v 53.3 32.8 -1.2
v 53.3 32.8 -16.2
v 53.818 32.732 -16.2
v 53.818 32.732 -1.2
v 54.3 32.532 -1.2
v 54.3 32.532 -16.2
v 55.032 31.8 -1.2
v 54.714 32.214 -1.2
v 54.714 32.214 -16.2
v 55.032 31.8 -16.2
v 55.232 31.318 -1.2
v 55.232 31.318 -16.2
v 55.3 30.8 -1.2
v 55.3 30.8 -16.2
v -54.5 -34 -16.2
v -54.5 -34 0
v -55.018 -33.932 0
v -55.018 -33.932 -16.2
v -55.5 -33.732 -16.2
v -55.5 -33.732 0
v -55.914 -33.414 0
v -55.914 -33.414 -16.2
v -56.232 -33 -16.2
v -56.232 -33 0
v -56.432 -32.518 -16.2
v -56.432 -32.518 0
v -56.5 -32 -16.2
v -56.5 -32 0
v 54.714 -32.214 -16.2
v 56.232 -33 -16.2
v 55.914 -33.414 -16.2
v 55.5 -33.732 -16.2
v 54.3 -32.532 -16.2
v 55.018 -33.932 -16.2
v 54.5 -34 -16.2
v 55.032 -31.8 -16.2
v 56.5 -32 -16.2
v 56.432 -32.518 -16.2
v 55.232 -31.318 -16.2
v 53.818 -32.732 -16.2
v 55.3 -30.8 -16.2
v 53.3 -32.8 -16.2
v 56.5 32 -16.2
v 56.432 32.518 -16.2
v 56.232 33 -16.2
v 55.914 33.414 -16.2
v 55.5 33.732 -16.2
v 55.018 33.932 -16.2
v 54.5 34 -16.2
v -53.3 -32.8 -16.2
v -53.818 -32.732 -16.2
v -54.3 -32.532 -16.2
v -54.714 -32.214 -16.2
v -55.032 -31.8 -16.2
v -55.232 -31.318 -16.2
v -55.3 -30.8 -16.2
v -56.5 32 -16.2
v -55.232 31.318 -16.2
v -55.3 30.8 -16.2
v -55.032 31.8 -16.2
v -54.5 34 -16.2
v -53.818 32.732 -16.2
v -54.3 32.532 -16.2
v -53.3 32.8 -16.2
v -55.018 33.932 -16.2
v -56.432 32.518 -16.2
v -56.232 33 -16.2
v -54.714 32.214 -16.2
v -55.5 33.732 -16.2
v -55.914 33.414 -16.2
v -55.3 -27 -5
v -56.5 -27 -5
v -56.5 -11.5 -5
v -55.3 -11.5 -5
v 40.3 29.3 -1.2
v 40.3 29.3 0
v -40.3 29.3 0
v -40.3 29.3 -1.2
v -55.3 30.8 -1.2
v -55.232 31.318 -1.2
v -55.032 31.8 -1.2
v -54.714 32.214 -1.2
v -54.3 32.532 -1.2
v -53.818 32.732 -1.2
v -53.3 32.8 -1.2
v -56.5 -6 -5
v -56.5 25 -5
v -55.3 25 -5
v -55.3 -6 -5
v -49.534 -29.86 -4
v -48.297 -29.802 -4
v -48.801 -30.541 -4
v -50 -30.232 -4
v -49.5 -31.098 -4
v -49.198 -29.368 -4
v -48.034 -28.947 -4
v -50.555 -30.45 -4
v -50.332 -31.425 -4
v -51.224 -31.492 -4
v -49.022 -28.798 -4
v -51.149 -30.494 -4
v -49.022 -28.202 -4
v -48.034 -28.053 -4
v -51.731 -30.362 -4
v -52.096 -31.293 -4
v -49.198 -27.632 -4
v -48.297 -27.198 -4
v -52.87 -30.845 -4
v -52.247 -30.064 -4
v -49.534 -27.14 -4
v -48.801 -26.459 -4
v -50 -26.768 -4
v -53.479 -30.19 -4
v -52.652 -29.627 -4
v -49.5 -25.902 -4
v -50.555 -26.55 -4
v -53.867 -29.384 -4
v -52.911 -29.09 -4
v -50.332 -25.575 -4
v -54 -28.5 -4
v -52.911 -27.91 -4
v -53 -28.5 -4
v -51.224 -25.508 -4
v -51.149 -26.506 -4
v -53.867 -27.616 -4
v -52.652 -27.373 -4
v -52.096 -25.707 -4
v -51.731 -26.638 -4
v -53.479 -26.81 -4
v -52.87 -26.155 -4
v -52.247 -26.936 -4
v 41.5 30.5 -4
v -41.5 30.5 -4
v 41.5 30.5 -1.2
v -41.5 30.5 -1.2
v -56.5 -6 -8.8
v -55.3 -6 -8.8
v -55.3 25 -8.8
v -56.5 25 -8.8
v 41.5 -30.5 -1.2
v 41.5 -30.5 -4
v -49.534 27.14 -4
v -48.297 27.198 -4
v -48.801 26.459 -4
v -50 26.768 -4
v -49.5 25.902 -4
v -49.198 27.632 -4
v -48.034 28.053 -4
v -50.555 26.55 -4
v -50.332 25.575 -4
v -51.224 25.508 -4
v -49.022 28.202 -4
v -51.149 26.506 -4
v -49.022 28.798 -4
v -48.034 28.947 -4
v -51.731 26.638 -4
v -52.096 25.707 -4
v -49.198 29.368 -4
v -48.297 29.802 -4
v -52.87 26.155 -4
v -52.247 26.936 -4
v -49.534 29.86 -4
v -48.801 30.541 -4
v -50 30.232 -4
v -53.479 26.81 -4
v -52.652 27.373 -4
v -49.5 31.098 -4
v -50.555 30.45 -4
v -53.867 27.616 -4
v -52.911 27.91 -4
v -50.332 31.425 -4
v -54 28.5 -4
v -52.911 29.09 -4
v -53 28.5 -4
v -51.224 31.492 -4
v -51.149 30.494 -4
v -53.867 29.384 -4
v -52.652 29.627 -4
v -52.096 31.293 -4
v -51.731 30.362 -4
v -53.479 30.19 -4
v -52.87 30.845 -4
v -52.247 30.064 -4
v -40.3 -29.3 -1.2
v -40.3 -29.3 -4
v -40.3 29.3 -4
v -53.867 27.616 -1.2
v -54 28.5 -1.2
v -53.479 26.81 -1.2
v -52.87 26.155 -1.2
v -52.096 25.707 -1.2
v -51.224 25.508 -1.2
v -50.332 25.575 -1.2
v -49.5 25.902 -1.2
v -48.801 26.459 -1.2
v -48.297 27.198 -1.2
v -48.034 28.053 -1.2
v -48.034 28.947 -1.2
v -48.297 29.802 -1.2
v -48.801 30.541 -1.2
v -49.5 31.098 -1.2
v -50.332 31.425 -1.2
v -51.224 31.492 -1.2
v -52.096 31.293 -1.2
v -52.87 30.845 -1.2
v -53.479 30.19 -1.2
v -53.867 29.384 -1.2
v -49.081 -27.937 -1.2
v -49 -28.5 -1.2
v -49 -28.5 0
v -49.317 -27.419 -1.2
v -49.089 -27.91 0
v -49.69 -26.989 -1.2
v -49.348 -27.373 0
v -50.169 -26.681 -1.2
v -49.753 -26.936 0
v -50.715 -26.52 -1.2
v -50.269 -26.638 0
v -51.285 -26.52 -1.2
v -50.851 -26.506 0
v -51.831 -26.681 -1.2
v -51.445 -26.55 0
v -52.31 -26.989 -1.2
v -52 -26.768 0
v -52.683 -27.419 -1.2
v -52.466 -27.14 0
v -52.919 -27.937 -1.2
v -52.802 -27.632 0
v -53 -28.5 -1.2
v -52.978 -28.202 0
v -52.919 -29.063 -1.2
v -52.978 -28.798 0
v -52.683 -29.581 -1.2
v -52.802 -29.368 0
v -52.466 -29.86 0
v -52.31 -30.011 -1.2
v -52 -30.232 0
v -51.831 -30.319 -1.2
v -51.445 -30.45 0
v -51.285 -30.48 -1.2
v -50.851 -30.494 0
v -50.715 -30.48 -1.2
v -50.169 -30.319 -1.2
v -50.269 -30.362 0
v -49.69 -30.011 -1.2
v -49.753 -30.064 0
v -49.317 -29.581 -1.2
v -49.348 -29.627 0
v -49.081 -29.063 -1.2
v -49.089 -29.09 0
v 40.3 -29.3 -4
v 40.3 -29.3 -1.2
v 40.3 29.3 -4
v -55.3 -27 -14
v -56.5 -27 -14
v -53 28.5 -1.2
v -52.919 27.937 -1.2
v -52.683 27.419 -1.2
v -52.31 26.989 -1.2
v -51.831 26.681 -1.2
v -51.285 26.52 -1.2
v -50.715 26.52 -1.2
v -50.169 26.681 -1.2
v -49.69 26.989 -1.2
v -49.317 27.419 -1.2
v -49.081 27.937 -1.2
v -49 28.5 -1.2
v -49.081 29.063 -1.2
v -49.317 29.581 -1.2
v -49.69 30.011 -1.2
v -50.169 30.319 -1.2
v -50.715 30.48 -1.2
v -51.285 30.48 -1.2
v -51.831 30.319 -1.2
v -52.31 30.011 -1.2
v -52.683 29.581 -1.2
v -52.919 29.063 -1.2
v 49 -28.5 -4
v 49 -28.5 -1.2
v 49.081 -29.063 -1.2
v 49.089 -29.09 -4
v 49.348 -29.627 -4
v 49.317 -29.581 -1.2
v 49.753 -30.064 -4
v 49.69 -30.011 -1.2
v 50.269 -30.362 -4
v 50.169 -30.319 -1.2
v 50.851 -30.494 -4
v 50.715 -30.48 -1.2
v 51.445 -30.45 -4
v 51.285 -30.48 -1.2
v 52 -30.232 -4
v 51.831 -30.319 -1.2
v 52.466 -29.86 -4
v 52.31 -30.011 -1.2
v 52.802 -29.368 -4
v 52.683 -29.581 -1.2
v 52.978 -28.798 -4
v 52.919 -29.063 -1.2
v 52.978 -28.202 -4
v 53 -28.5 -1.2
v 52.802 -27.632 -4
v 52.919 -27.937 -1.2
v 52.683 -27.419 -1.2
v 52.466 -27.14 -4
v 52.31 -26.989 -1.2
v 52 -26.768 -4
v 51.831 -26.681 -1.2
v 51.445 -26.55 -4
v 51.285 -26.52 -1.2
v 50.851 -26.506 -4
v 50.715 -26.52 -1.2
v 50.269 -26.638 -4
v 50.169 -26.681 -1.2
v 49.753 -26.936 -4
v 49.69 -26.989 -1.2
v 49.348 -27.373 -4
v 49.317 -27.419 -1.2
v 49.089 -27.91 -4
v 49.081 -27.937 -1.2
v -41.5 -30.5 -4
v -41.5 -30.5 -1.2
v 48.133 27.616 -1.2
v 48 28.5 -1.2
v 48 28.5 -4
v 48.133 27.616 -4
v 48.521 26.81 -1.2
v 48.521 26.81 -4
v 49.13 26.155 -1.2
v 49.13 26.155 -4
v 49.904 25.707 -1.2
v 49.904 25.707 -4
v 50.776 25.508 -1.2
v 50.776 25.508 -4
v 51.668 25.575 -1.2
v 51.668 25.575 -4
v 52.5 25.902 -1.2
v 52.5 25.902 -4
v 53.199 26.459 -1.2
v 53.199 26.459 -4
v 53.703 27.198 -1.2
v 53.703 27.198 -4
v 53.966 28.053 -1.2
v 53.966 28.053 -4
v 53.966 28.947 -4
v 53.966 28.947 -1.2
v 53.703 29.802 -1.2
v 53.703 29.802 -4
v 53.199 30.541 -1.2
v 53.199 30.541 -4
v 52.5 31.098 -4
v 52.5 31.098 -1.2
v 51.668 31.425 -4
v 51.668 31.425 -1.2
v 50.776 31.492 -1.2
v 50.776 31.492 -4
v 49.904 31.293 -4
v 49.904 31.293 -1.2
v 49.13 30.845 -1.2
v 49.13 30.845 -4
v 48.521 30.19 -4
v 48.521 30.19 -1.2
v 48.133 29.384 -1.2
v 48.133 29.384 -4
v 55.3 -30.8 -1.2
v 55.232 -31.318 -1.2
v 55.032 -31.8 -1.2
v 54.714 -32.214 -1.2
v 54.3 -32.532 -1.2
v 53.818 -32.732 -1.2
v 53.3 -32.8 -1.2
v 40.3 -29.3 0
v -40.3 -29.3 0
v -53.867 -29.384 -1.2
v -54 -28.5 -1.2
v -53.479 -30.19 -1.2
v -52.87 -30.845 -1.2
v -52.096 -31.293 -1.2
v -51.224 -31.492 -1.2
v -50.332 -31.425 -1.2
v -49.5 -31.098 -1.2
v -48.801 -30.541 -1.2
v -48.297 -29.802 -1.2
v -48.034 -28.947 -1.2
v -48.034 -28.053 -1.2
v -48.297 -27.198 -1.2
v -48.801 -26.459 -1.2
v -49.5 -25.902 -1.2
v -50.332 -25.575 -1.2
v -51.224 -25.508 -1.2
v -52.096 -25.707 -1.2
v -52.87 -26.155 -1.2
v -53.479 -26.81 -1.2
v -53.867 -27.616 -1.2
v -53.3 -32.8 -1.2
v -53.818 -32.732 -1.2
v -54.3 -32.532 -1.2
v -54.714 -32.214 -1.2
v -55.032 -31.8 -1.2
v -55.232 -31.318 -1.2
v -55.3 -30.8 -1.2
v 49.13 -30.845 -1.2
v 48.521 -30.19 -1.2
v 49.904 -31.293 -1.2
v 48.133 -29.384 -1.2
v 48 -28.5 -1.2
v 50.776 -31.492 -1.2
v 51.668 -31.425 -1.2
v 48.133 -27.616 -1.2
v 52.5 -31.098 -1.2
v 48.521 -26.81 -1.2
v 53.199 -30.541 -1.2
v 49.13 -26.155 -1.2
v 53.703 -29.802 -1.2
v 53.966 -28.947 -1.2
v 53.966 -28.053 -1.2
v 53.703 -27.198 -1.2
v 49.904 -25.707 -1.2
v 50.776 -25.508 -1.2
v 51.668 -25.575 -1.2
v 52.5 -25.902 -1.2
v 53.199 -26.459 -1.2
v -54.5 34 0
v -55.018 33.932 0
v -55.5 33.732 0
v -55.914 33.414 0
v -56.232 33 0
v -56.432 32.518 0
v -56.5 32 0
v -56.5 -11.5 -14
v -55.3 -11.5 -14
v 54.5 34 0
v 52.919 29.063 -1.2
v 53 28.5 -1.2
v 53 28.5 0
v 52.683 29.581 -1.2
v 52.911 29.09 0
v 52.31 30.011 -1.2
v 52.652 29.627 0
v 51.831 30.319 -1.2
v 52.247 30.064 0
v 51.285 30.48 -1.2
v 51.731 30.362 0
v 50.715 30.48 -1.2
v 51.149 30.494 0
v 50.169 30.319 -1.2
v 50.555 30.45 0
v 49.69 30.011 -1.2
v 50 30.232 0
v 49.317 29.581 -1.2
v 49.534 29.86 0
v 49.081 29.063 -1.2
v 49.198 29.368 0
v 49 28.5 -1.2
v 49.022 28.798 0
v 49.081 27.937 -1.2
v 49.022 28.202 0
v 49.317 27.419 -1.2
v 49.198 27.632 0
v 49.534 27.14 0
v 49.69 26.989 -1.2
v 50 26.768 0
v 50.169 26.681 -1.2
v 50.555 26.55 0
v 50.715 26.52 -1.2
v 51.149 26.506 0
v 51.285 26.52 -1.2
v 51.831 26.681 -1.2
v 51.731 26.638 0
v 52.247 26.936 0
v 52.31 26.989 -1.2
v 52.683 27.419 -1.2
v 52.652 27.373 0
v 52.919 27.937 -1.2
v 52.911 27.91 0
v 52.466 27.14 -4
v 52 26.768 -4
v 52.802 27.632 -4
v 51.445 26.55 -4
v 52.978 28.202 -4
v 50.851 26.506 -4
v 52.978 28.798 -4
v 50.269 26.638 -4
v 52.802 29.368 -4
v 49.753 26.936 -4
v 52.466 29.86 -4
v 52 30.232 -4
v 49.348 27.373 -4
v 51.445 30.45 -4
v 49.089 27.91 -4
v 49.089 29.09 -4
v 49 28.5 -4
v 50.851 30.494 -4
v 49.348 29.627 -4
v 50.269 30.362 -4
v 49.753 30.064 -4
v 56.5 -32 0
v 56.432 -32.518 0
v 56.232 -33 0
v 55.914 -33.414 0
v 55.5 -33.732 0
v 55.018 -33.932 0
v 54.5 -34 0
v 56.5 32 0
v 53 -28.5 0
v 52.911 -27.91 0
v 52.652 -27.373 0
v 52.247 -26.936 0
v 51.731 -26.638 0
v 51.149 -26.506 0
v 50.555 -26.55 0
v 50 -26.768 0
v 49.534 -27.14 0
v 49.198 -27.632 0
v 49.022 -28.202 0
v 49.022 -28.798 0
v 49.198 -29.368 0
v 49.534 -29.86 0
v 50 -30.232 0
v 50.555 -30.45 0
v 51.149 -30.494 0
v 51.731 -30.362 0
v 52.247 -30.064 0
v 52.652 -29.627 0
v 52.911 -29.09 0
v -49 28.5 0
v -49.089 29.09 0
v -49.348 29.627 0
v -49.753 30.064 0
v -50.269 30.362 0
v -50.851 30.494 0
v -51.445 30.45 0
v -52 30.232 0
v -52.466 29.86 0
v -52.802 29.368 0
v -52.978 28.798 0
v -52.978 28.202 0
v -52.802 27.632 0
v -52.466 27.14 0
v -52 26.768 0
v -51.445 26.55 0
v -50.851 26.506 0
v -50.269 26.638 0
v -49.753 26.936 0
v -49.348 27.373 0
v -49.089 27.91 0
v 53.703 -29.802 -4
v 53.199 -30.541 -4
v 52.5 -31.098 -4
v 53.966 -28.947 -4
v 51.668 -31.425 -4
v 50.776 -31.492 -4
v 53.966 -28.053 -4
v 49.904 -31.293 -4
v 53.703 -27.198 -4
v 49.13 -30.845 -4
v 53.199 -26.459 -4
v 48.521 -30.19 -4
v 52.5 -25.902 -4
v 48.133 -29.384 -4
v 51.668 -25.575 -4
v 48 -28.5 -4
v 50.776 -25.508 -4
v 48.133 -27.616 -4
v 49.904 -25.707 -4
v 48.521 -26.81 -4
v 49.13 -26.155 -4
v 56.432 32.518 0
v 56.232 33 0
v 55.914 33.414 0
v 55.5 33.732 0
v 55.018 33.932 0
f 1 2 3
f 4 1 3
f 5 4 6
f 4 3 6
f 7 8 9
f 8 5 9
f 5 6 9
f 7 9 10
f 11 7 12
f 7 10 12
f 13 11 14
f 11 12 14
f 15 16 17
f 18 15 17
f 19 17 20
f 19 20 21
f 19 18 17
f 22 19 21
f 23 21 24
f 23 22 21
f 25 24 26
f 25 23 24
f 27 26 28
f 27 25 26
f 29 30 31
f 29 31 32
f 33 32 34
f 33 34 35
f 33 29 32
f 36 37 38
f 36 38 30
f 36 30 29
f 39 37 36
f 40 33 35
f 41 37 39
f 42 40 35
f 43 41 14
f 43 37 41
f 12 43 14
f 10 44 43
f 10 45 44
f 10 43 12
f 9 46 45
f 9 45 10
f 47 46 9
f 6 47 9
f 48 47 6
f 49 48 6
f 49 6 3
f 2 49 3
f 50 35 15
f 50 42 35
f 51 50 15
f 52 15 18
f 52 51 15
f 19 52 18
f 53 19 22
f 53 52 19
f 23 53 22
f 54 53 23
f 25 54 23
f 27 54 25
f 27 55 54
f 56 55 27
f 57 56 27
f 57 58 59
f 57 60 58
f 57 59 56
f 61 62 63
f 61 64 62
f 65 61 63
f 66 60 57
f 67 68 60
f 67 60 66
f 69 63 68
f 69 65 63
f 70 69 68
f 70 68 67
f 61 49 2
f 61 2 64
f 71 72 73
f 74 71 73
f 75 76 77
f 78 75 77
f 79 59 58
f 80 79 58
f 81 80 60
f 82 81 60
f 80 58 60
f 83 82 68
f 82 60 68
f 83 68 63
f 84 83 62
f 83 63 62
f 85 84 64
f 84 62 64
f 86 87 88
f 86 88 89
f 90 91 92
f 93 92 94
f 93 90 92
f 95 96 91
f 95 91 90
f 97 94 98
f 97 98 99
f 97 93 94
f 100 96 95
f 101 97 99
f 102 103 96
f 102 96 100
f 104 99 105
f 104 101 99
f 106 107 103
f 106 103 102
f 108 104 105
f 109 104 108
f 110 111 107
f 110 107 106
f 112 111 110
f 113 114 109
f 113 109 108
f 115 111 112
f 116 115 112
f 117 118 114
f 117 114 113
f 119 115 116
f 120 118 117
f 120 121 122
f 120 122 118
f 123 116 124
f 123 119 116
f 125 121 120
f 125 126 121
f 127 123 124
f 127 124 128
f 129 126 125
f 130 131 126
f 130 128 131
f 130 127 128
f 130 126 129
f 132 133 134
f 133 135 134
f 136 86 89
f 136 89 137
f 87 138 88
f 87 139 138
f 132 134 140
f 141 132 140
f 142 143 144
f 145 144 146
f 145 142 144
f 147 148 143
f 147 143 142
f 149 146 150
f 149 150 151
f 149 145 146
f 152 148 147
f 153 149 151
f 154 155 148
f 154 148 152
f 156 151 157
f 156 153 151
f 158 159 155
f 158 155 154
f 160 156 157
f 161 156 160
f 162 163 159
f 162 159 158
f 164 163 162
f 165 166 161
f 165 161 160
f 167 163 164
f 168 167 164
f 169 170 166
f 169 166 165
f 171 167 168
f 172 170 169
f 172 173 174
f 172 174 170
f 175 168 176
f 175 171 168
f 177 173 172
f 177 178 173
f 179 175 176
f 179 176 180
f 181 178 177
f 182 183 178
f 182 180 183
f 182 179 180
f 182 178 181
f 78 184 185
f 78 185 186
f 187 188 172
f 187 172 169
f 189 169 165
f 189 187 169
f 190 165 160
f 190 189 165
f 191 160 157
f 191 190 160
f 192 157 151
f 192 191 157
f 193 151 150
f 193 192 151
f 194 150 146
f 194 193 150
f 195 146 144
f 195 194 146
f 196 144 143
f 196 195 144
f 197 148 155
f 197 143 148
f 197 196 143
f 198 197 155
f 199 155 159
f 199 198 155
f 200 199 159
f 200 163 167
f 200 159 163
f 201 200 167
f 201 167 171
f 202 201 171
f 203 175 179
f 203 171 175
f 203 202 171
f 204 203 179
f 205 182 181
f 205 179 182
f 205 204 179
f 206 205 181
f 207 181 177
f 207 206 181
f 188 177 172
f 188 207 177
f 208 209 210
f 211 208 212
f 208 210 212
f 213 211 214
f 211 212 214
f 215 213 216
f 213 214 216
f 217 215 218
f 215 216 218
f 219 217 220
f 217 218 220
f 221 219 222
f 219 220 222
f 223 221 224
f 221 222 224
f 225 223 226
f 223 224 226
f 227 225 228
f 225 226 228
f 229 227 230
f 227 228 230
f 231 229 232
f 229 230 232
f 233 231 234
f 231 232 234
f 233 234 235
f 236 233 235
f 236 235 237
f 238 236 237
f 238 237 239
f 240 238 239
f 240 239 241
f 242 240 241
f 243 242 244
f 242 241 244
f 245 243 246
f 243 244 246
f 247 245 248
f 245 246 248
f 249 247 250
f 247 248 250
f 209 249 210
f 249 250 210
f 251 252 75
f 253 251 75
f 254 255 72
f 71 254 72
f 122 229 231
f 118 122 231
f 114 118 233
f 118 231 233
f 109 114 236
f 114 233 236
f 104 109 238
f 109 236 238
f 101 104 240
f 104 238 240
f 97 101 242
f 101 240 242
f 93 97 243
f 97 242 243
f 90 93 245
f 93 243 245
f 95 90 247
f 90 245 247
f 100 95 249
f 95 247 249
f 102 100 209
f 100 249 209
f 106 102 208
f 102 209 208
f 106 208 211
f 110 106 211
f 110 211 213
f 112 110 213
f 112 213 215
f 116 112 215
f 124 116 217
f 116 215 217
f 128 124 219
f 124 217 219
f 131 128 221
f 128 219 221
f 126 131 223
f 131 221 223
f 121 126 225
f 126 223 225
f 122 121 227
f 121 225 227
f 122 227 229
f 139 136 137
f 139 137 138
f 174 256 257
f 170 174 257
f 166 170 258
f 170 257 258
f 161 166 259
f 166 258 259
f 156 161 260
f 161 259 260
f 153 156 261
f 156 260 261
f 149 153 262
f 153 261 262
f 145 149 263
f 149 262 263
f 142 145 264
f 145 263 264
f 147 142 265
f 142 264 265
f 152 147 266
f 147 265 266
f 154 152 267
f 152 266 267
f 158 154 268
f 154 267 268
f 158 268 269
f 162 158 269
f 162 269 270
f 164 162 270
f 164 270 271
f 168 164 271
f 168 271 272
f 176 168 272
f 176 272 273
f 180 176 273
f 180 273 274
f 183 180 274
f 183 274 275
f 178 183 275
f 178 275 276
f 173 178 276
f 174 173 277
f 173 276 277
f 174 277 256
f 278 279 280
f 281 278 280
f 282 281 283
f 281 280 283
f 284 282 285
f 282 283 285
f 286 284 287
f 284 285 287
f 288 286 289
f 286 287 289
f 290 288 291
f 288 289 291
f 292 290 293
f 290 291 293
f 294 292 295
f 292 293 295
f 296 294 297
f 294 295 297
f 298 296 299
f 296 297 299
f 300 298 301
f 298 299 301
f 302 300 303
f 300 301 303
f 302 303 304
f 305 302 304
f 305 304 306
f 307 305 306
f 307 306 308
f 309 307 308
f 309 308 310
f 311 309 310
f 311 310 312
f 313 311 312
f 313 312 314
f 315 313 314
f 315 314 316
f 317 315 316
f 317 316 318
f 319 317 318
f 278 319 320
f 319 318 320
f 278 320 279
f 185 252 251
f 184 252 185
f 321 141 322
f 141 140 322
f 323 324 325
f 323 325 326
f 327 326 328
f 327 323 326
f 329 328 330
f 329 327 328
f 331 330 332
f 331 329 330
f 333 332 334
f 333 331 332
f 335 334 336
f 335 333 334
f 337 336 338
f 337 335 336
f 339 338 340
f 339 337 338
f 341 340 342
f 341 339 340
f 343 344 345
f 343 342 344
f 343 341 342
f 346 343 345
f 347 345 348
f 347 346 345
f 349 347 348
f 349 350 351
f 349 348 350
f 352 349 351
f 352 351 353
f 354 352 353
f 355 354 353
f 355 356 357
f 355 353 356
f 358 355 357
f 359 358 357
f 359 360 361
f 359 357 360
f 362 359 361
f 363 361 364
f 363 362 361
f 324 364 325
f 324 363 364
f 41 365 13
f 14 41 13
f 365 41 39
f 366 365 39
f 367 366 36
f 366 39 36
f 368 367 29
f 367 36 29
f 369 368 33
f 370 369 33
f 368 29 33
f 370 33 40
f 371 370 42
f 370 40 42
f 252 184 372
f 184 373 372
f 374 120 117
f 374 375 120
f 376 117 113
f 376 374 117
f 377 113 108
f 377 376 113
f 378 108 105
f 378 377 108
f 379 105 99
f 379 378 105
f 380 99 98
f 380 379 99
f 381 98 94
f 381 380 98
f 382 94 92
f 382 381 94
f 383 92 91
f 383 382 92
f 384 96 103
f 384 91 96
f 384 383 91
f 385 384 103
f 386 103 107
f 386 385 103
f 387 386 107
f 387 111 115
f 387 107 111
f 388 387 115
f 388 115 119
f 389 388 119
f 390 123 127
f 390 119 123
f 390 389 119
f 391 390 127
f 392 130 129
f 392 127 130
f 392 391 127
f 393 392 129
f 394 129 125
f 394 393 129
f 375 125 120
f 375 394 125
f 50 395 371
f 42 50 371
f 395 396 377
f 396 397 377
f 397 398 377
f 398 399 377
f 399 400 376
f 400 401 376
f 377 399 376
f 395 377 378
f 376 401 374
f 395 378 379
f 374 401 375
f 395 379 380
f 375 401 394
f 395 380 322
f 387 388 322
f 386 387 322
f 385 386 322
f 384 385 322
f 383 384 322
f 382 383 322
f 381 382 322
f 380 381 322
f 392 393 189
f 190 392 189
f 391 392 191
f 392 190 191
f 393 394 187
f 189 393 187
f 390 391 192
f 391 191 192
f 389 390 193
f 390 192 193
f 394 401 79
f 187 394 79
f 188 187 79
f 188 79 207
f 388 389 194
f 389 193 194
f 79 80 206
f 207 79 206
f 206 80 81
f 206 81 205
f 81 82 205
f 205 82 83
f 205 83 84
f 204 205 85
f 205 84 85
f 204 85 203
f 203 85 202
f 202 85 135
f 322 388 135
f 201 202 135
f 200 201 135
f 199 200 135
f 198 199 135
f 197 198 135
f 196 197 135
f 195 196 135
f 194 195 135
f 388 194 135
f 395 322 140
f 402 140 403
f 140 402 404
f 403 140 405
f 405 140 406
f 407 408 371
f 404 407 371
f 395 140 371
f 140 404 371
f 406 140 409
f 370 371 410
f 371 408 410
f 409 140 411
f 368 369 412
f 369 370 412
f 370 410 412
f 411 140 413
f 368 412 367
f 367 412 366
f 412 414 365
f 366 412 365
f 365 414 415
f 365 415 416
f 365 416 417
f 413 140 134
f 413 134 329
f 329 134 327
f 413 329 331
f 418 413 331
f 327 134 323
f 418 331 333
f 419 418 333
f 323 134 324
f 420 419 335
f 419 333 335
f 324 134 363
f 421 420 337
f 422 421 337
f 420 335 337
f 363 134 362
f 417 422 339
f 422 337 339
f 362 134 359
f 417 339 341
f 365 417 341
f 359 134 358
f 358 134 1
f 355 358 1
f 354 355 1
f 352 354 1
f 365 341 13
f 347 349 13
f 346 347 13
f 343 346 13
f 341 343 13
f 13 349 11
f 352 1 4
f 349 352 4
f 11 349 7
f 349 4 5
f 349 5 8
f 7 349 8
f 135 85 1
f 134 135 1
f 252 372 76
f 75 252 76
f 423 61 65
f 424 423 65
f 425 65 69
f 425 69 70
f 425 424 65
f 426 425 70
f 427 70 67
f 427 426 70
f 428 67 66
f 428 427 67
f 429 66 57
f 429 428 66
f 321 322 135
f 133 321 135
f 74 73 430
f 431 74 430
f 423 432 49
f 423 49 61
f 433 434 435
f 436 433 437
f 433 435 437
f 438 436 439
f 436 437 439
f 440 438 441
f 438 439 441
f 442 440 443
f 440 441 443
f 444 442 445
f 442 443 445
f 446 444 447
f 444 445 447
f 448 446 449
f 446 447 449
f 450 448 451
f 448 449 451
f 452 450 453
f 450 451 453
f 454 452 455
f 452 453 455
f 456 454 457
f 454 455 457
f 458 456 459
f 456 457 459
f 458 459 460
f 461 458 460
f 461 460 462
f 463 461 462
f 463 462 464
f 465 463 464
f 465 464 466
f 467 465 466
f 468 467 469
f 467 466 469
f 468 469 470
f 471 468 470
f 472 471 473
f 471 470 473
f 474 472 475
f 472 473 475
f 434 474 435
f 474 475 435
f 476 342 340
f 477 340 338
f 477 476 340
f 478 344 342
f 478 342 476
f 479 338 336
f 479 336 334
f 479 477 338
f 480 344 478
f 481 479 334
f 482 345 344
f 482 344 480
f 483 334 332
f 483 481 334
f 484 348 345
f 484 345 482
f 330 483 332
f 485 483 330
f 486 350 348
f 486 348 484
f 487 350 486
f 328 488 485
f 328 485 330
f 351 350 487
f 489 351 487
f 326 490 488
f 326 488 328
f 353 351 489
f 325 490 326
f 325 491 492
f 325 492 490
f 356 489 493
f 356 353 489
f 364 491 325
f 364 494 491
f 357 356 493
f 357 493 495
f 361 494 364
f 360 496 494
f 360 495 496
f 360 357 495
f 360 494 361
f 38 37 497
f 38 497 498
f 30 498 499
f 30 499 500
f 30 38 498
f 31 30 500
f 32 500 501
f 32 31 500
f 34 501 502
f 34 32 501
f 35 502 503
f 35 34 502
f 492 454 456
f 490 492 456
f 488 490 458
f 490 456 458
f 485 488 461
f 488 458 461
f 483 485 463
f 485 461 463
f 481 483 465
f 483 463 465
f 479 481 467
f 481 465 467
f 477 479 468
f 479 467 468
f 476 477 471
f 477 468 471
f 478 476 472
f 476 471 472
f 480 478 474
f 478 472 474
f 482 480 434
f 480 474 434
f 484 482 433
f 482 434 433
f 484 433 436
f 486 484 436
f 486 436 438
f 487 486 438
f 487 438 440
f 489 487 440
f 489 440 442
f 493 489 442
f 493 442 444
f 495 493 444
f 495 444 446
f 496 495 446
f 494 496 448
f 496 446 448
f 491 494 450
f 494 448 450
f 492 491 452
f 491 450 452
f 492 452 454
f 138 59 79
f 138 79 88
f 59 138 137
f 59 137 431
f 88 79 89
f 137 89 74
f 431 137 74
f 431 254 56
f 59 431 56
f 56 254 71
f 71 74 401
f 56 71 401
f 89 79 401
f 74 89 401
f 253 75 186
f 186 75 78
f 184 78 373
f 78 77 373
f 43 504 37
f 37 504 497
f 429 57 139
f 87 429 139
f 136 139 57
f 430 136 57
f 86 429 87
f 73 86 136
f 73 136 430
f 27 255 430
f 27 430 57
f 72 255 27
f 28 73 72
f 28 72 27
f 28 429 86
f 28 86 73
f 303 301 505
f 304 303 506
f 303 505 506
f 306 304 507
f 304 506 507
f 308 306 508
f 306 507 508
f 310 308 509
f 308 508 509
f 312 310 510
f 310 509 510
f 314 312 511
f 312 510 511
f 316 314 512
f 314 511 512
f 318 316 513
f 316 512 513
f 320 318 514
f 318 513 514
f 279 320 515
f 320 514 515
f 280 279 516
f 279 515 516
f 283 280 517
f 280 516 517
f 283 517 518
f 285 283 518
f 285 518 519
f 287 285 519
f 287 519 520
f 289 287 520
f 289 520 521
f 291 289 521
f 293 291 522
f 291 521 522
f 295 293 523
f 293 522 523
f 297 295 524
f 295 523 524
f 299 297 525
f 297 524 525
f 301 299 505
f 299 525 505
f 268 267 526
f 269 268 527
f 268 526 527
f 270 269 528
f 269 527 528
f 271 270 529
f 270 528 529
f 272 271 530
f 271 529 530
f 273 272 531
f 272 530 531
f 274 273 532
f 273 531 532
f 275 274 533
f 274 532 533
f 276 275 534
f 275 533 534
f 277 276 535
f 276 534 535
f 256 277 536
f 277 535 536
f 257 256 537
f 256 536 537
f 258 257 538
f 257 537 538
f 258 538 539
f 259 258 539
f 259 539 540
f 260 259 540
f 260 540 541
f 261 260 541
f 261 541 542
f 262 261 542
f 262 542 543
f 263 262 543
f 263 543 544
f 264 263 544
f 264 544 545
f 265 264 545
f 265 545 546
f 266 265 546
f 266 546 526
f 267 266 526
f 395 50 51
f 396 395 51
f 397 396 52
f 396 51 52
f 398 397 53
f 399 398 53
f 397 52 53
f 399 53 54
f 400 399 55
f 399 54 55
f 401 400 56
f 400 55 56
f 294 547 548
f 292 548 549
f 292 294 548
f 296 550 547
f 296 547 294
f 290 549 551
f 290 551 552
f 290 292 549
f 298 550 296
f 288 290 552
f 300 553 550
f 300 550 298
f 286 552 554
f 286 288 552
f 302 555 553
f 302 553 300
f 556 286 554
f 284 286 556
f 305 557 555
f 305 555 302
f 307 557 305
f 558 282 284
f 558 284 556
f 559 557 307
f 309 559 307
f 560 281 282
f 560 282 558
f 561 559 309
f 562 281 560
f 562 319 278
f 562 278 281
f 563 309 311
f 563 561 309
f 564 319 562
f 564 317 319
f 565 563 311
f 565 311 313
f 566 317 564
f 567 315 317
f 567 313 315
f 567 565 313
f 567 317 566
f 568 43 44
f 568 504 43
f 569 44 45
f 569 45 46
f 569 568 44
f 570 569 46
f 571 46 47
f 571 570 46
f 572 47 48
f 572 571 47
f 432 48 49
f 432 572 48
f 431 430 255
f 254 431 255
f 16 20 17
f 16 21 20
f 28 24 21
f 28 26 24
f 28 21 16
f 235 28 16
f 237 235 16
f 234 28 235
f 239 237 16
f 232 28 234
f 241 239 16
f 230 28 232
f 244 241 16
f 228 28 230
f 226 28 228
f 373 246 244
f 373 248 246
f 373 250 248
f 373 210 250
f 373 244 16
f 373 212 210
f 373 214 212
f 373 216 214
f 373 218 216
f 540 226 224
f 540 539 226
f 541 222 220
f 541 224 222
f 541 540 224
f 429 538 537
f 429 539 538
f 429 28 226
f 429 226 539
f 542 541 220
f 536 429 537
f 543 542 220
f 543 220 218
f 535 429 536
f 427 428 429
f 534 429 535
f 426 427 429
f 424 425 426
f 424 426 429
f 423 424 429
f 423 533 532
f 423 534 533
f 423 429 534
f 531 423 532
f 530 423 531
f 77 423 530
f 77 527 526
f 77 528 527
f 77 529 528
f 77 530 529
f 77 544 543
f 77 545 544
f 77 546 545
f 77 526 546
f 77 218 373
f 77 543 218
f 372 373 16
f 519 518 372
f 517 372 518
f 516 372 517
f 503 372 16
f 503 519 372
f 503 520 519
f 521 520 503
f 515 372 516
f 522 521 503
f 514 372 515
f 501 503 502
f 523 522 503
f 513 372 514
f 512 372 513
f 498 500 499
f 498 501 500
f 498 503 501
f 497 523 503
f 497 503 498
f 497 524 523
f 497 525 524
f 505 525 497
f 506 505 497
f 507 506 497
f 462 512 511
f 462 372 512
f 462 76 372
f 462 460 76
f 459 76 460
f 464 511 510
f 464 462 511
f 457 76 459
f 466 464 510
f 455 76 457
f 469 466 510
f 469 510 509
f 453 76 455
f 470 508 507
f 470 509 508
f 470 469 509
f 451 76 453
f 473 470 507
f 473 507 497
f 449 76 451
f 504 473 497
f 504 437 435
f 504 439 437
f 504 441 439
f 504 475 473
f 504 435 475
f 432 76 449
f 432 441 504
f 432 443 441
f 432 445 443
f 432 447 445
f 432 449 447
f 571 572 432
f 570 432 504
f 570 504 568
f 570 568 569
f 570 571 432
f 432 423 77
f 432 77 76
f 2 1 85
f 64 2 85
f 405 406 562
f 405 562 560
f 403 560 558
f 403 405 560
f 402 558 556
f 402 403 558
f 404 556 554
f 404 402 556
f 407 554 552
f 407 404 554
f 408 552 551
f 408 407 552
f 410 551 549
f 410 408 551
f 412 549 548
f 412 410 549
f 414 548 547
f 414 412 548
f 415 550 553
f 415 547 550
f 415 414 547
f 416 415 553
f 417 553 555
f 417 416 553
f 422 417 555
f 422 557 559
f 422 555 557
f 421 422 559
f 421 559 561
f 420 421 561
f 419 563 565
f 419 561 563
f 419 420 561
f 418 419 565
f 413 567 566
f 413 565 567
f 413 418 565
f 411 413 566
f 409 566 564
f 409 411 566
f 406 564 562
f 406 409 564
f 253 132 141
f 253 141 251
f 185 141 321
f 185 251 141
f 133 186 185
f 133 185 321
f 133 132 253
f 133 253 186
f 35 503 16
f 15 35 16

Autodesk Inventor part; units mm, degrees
ref_plane "YZ Plane" through (0, 0, 0) normal (1, 0, 0) x (0, 1, 0)
ref_plane "XZ Plane" through (0, 0, 0) normal (0, 1, 0) x (-1, 0, 0)
sketch "Skizze1" plane through (0, 0, 0) normal (0, 0, 1) x (1, 0, 0)
  line L0 (-40.3, -29.3) -> (40.3, -29.3)
  line L1 (40.3, -29.3) -> (40.3, 29.3)
  line L2 (40.3, 29.3) -> (-40.3, 29.3)
  line L3 (-40.3, 29.3) -> (-40.3, -29.3)
  line L4 (40, 29) -> (-40, 29) projected
  line L5 (-40, 29) -> (-40, -29) projected
  line L6 (-40, -29) -> (40, -29) projected
  line L7 (40, -29) -> (40, 29) projected
  line L8 (-56.5, -34) -> (56.5, -34)
  line L9 (56.5, -34) -> (56.5, 34)
  line L10 (56.5, 34) -> (-56.5, 34)
  line L11 (-56.5, 34) -> (-56.5, -34)
  line L12 (53, 32.5) -> (-53, 32.5) projected
  line L13 (-53, -32.5) -> (53, -32.5) projected
  line L14 (55, -30.5) -> (55, 30.5) projected
  line L15 (-55, 30.5) -> (-55, -30.5) projected
  circle A0 centre (-51, 28.5) radius 2 projected
  circle A1 centre (51, 28.5) radius 2 projected
  circle A2 centre (51, -28.5) radius 2 projected
  circle A3 centre (-51, -28.5) radius 2 projected
  point P0 (0, 0)
  dimension "d0" = 0.3
  dimension "d1" = 0.3
  dimension "d2" = 0.3
  dimension "d3" = 0.3
  dimension "d4" = 1.5
  dimension "d5" = 1.5
  dimension "d6" = 1.5
  dimension "d7" = 1.5
extrude "Extrusion1" add sketch "Skizze1" against normal blind 1.2 contours L11 L10 L9 L8
sketch "Skizze2" plane through (0, 0, -1.2) normal (0, 0, -1) x (-1, 0, 0)
  circle A0 centre (-51, 28.5) radius 2 projected
  circle A1 centre (51, 28.5) radius 2 projected
  circle A2 centre (51, -28.5) radius 2 projected
  circle A3 centre (-51, -28.5) radius 2 projected
  circle A4 centre (-51, 28.5) radius 3
  circle A5 centre (51, 28.5) radius 3
  circle A6 centre (-51, -28.5) radius 3
  circle A7 centre (51, -28.5) radius 3
  line L0 (-40.3, -29.3) -> (-40.3, 29.3) projected
  line L1 (-40.3, 29.3) -> (40.3, 29.3) projected
  line L2 (-40.3, -29.3) -> (40.3, -29.3)
  line L3 (40.3, -29.3) -> (40.3, 29.3)
  line L4 (40.3, 29.3) -> (-40.3, 29.3)
  line L5 (-40.3, 29.3) -> (-40.3, -29.3)
  line L6 (41.5, 30.5) -> (-41.5, 30.5)
  line L7 (-41.5, 30.5) -> (-41.5, -30.5)
  line L8 (-41.5, -30.5) -> (41.5, -30.5)
  line L9 (41.5, -30.5) -> (41.5, 30.5)
  point P0 (0, 0)
  point P1 (53.2361, -26.5)
  point P2 (48.7639, -26.5)
  point P3 (51, -26.5)
  dimension "d10" = 6
  dimension "d11" = 6
  dimension "d12" = 6
  dimension "d13" = 6
  dimension "d14" = 1.2
  dimension "d15" = 1.2
  dimension "d16" = 1.2
  dimension "d17" = 1.2
ref_plane "Arbeitsebene1" through (-55, -32.5, -4) normal (0, 0, 1) x (1, 0, 0)
extrude "Extrusion2" add sketch "Skizze2" along normal up to surface (2.8 mm away)
sketch "Skizze3" plane through (0, 0, -1.2) normal (0, 0, -1) x (-1, 0, 0)
  line L0 (-56.5, -34) -> (56.5, -34) projected
  line L1 (-56.5, 34) -> (-56.5, -34) projected
  line L2 (56.5, -34) -> (-56.5, -34)
  line L3 (-56.5, -34) -> (-56.5, 34)
  line L4 (-56.5, 34) -> (56.5, 34)
  line L5 (56.5, 34) -> (56.5, -34)
  line L6 (-55.3, 32.8) -> (55.3, 32.8)
  line L7 (55.3, 32.8) -> (55.3, -32.8)
  line L8 (55.3, -32.8) -> (-55.3, -32.8)
  line L9 (-55.3, -32.8) -> (-55.3, 32.8)
  point P0 (0, 0)
  dimension "d20" = 1.2
  dimension "d21" = 1.2
  dimension "d22" = 1.2
  dimension "d23" = 1.2
extrude "Extrusion3" add sketch "Skizze3" along normal blind 15
fillet "Rundung1" radius 2 8 edges at (55.3, 32.8, -8.7) (-55.3, 32.8, -8.7) (-55.3, -32.8, -8.7) (56.5, -34, -8.1) (-56.5, -34, -8.1) (-56.5, 34, -8.1) (56.5, 34, -8.1) (55.3, -32.8, -8.7)
sketch "Skizze4" plane through (-56.5, -32, 0) normal (-1, 0, 0) x (0, 0, 1)
  line L0 (-5.5, 1.5) -> (-5.5, 5.5) construction
  line L1 (-5.5, 1.5) -> (-4, 1.5) construction
  line L2 (-4, 62.5) -> (-4, 1.5) construction
  line L3 (-5.5, 62.5) -> (-4, 62.5) construction
  line L4 (-5.5, 56.5) -> (-5.5, 62.5) construction
  line L5 (-5.5, 56.5) -> (-8.3, 56.5) construction
  line L6 (-8.3, 26.5) -> (-8.3, 56.5) construction
  line L7 (-5.5, 26.5) -> (-8.3, 26.5) construction
  line L8 (-5.5, 20) -> (-5.5, 26.5) construction
  line L9 (-5.5, 20) -> (-13.5, 20) construction
  line L10 (-13.5, 5.5) -> (-13.5, 20) construction
  line L11 (-5.5, 5.5) -> (-13.5, 5.5) construction
  line L12 (-5, 20.5) -> (-14, 20.5)
  line L13 (-14, 20.5) -> (-14, 5)
  line L14 (-14, 5) -> (-5, 5)
  line L15 (-5, 5) -> (-5, 20.5)
  line L16 (-5, 26) -> (-8.8, 26)
  line L17 (-8.8, 26) -> (-8.8, 57)
  line L18 (-8.8, 57) -> (-5, 57)
  line L19 (-5, 57) -> (-5, 26)
  point P0 (0, 32)
  dimension "d27" = 0.5
  dimension "d28" = 0.5
  dimension "d29" = 0.5
  dimension "d30" = 0.5
  dimension "d31" = 0.5
  dimension "d32" = 0.5
  dimension "d33" = 0.5
extrude "Extrusion4" cut sketch "Skizze4" against normal up to next
properties part number "front_case" material "ABS-Kunststoff"
